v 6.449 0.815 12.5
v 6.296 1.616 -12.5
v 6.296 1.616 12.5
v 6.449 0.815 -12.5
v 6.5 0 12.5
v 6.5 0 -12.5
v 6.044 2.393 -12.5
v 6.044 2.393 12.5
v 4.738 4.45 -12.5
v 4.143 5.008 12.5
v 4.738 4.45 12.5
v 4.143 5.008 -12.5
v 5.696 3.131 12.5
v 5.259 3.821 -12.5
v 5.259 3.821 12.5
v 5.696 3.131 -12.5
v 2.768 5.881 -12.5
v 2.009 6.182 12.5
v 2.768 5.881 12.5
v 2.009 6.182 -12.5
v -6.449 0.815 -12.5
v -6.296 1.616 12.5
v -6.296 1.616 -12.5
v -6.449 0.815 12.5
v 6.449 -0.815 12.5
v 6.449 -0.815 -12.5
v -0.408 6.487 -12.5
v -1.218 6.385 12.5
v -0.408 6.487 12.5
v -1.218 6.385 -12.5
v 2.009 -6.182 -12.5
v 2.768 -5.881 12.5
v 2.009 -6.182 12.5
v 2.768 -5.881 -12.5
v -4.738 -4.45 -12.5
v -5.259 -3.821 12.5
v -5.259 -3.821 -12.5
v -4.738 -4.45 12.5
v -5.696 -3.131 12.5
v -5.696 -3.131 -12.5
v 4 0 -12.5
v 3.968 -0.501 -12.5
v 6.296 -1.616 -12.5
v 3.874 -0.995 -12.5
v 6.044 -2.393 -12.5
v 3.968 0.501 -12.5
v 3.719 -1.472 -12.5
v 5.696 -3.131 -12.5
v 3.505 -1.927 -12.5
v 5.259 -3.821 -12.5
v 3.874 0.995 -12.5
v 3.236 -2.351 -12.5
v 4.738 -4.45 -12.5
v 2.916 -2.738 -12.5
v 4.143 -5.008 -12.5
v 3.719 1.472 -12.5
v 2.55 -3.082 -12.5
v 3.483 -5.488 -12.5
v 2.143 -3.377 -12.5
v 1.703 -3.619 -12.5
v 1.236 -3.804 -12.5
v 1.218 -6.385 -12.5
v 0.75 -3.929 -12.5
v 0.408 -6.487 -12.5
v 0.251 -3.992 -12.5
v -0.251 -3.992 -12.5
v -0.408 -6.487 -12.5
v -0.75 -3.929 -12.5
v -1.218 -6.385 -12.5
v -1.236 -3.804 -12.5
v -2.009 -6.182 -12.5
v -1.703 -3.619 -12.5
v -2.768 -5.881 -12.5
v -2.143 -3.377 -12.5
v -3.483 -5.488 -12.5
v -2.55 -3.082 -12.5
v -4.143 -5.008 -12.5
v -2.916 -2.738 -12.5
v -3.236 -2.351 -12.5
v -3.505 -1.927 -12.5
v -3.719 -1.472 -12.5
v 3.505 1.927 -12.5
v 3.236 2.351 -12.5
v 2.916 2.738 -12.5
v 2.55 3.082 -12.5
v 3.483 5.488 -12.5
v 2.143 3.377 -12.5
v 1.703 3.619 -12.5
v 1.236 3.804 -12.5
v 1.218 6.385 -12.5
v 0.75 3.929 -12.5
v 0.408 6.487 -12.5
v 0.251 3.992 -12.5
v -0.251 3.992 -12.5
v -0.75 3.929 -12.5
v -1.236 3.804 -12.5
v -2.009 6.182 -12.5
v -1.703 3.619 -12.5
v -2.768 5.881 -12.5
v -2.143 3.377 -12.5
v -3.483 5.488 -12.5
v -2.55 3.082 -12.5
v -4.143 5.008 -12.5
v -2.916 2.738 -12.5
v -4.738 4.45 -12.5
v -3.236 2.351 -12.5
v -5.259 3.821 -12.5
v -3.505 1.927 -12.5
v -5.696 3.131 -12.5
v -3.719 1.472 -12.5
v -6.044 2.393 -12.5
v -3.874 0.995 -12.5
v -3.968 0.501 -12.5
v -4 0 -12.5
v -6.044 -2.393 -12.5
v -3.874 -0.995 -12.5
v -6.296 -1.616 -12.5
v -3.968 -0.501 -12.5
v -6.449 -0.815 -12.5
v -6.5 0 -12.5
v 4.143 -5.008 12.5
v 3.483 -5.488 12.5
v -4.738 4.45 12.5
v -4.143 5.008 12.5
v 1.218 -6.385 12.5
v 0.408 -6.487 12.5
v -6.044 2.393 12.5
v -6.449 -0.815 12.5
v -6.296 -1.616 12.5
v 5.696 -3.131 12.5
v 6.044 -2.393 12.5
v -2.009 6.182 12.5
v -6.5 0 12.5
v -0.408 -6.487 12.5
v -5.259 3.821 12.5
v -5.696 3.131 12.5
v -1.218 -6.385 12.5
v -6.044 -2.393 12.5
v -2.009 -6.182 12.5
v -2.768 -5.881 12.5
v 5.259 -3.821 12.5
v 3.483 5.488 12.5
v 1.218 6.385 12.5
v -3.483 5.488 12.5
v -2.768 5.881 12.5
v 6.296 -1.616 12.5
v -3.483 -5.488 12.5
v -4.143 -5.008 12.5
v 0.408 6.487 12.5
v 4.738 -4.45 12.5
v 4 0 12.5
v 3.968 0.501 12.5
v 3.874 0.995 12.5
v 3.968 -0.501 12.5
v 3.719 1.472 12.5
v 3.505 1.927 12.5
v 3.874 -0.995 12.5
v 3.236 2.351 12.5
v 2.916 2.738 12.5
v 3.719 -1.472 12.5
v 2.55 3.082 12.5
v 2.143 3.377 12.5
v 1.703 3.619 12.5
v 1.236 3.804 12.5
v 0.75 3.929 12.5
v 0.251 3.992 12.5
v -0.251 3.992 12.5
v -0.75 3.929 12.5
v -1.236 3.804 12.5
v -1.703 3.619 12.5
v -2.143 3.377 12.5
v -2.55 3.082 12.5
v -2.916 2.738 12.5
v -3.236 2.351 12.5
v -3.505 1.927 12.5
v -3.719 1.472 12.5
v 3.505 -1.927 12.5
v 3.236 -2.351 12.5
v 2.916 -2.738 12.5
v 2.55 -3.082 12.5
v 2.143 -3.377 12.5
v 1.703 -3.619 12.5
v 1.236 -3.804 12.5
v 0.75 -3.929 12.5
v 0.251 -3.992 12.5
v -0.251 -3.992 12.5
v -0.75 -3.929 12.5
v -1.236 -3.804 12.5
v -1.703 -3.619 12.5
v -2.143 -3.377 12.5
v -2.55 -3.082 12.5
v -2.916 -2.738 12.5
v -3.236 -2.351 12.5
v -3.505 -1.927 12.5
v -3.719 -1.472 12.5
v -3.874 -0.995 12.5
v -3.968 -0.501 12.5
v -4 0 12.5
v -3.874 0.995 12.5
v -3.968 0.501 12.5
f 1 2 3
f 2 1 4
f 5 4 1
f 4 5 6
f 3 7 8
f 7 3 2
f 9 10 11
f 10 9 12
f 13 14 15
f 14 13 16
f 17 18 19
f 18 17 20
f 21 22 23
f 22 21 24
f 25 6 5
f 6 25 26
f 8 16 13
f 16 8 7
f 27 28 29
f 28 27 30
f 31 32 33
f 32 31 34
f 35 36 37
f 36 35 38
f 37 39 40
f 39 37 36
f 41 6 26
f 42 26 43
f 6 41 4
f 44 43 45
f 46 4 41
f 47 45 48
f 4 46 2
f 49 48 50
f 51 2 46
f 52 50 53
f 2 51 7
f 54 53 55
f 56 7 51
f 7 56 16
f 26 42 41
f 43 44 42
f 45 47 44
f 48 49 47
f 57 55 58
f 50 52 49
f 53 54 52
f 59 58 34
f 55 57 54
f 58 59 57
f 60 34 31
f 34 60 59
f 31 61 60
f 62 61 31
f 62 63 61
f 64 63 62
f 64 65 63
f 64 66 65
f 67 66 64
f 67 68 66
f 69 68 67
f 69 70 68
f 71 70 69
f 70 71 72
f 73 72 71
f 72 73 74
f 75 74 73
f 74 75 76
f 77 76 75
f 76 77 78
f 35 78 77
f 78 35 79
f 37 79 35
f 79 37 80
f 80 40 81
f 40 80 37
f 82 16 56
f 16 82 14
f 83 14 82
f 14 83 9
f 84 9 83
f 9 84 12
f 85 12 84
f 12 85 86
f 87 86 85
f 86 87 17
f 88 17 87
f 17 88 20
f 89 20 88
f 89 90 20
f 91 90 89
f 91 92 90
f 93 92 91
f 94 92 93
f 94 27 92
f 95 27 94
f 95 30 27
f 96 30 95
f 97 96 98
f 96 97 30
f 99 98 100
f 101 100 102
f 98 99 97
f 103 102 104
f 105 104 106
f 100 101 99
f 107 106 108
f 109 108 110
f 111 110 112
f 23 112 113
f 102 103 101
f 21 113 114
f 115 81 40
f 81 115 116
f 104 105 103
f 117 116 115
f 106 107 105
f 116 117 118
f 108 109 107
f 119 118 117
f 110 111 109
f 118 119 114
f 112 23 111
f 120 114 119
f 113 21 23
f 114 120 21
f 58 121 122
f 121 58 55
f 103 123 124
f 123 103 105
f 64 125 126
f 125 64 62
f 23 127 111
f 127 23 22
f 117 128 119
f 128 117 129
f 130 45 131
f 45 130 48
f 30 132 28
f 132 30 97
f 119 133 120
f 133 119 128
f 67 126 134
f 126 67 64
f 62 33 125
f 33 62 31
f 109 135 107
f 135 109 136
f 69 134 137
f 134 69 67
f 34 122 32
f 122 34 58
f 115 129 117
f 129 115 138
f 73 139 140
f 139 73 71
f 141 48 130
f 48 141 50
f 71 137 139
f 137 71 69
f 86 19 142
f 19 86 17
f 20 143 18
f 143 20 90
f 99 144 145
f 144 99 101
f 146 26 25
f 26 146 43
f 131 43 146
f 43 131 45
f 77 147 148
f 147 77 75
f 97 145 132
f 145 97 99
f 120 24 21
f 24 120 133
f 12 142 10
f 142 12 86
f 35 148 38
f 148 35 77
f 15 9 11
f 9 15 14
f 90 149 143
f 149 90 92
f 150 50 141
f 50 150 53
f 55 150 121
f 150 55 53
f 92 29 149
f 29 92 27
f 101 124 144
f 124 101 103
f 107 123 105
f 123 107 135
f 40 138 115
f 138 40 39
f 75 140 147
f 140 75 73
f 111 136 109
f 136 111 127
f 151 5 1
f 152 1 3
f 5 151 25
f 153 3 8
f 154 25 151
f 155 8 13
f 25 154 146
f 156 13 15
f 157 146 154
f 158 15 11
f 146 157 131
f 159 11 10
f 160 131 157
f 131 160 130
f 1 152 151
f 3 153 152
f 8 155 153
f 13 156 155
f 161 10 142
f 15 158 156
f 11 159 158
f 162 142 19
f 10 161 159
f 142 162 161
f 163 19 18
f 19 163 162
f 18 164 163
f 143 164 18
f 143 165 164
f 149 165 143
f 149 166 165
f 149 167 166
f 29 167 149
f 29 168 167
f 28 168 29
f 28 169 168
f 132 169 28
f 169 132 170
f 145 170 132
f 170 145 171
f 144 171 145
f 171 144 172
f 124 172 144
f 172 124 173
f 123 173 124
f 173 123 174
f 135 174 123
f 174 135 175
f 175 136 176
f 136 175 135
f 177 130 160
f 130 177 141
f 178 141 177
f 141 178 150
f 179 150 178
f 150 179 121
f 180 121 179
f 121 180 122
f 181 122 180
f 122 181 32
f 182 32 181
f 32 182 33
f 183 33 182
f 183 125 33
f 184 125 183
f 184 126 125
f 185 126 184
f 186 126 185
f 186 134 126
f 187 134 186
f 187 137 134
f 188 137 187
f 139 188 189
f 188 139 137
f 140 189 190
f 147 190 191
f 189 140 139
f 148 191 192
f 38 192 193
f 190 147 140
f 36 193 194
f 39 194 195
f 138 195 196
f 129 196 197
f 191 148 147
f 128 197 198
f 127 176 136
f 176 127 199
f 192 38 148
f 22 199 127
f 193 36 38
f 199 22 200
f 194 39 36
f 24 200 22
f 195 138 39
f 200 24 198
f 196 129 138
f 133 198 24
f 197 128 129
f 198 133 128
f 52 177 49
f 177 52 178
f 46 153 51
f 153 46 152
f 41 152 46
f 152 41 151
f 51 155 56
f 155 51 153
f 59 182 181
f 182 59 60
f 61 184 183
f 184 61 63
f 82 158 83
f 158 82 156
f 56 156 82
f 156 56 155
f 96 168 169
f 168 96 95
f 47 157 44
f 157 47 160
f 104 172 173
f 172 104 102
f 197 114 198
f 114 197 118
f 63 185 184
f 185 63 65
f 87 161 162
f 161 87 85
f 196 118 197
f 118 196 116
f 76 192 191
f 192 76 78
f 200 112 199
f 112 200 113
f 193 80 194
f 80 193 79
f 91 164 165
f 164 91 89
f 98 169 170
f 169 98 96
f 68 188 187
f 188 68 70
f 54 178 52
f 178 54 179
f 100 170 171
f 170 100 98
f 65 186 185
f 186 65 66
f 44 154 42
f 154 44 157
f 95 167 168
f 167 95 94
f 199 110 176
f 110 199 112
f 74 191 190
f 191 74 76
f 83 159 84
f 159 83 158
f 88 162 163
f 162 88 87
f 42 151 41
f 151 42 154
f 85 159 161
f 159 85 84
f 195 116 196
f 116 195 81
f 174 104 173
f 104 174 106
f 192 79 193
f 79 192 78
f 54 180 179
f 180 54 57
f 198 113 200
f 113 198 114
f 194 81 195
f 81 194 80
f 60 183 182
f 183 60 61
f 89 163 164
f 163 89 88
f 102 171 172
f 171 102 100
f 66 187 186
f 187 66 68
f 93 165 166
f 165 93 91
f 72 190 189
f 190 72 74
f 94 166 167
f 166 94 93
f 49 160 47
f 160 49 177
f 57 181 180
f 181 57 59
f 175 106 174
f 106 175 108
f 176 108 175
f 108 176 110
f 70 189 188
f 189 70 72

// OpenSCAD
$fn = 50;


difference() {
	union() {
		translate(v = [0, 0, -12.5000000000]) {
			cylinder(h = 25, r = 6.5000000000);
		}
	}
	union() {
		translate(v = [0, 0, -100.0000000000]) {
			cylinder(h = 200, r = 4.0000000000);
		}
	}
}
